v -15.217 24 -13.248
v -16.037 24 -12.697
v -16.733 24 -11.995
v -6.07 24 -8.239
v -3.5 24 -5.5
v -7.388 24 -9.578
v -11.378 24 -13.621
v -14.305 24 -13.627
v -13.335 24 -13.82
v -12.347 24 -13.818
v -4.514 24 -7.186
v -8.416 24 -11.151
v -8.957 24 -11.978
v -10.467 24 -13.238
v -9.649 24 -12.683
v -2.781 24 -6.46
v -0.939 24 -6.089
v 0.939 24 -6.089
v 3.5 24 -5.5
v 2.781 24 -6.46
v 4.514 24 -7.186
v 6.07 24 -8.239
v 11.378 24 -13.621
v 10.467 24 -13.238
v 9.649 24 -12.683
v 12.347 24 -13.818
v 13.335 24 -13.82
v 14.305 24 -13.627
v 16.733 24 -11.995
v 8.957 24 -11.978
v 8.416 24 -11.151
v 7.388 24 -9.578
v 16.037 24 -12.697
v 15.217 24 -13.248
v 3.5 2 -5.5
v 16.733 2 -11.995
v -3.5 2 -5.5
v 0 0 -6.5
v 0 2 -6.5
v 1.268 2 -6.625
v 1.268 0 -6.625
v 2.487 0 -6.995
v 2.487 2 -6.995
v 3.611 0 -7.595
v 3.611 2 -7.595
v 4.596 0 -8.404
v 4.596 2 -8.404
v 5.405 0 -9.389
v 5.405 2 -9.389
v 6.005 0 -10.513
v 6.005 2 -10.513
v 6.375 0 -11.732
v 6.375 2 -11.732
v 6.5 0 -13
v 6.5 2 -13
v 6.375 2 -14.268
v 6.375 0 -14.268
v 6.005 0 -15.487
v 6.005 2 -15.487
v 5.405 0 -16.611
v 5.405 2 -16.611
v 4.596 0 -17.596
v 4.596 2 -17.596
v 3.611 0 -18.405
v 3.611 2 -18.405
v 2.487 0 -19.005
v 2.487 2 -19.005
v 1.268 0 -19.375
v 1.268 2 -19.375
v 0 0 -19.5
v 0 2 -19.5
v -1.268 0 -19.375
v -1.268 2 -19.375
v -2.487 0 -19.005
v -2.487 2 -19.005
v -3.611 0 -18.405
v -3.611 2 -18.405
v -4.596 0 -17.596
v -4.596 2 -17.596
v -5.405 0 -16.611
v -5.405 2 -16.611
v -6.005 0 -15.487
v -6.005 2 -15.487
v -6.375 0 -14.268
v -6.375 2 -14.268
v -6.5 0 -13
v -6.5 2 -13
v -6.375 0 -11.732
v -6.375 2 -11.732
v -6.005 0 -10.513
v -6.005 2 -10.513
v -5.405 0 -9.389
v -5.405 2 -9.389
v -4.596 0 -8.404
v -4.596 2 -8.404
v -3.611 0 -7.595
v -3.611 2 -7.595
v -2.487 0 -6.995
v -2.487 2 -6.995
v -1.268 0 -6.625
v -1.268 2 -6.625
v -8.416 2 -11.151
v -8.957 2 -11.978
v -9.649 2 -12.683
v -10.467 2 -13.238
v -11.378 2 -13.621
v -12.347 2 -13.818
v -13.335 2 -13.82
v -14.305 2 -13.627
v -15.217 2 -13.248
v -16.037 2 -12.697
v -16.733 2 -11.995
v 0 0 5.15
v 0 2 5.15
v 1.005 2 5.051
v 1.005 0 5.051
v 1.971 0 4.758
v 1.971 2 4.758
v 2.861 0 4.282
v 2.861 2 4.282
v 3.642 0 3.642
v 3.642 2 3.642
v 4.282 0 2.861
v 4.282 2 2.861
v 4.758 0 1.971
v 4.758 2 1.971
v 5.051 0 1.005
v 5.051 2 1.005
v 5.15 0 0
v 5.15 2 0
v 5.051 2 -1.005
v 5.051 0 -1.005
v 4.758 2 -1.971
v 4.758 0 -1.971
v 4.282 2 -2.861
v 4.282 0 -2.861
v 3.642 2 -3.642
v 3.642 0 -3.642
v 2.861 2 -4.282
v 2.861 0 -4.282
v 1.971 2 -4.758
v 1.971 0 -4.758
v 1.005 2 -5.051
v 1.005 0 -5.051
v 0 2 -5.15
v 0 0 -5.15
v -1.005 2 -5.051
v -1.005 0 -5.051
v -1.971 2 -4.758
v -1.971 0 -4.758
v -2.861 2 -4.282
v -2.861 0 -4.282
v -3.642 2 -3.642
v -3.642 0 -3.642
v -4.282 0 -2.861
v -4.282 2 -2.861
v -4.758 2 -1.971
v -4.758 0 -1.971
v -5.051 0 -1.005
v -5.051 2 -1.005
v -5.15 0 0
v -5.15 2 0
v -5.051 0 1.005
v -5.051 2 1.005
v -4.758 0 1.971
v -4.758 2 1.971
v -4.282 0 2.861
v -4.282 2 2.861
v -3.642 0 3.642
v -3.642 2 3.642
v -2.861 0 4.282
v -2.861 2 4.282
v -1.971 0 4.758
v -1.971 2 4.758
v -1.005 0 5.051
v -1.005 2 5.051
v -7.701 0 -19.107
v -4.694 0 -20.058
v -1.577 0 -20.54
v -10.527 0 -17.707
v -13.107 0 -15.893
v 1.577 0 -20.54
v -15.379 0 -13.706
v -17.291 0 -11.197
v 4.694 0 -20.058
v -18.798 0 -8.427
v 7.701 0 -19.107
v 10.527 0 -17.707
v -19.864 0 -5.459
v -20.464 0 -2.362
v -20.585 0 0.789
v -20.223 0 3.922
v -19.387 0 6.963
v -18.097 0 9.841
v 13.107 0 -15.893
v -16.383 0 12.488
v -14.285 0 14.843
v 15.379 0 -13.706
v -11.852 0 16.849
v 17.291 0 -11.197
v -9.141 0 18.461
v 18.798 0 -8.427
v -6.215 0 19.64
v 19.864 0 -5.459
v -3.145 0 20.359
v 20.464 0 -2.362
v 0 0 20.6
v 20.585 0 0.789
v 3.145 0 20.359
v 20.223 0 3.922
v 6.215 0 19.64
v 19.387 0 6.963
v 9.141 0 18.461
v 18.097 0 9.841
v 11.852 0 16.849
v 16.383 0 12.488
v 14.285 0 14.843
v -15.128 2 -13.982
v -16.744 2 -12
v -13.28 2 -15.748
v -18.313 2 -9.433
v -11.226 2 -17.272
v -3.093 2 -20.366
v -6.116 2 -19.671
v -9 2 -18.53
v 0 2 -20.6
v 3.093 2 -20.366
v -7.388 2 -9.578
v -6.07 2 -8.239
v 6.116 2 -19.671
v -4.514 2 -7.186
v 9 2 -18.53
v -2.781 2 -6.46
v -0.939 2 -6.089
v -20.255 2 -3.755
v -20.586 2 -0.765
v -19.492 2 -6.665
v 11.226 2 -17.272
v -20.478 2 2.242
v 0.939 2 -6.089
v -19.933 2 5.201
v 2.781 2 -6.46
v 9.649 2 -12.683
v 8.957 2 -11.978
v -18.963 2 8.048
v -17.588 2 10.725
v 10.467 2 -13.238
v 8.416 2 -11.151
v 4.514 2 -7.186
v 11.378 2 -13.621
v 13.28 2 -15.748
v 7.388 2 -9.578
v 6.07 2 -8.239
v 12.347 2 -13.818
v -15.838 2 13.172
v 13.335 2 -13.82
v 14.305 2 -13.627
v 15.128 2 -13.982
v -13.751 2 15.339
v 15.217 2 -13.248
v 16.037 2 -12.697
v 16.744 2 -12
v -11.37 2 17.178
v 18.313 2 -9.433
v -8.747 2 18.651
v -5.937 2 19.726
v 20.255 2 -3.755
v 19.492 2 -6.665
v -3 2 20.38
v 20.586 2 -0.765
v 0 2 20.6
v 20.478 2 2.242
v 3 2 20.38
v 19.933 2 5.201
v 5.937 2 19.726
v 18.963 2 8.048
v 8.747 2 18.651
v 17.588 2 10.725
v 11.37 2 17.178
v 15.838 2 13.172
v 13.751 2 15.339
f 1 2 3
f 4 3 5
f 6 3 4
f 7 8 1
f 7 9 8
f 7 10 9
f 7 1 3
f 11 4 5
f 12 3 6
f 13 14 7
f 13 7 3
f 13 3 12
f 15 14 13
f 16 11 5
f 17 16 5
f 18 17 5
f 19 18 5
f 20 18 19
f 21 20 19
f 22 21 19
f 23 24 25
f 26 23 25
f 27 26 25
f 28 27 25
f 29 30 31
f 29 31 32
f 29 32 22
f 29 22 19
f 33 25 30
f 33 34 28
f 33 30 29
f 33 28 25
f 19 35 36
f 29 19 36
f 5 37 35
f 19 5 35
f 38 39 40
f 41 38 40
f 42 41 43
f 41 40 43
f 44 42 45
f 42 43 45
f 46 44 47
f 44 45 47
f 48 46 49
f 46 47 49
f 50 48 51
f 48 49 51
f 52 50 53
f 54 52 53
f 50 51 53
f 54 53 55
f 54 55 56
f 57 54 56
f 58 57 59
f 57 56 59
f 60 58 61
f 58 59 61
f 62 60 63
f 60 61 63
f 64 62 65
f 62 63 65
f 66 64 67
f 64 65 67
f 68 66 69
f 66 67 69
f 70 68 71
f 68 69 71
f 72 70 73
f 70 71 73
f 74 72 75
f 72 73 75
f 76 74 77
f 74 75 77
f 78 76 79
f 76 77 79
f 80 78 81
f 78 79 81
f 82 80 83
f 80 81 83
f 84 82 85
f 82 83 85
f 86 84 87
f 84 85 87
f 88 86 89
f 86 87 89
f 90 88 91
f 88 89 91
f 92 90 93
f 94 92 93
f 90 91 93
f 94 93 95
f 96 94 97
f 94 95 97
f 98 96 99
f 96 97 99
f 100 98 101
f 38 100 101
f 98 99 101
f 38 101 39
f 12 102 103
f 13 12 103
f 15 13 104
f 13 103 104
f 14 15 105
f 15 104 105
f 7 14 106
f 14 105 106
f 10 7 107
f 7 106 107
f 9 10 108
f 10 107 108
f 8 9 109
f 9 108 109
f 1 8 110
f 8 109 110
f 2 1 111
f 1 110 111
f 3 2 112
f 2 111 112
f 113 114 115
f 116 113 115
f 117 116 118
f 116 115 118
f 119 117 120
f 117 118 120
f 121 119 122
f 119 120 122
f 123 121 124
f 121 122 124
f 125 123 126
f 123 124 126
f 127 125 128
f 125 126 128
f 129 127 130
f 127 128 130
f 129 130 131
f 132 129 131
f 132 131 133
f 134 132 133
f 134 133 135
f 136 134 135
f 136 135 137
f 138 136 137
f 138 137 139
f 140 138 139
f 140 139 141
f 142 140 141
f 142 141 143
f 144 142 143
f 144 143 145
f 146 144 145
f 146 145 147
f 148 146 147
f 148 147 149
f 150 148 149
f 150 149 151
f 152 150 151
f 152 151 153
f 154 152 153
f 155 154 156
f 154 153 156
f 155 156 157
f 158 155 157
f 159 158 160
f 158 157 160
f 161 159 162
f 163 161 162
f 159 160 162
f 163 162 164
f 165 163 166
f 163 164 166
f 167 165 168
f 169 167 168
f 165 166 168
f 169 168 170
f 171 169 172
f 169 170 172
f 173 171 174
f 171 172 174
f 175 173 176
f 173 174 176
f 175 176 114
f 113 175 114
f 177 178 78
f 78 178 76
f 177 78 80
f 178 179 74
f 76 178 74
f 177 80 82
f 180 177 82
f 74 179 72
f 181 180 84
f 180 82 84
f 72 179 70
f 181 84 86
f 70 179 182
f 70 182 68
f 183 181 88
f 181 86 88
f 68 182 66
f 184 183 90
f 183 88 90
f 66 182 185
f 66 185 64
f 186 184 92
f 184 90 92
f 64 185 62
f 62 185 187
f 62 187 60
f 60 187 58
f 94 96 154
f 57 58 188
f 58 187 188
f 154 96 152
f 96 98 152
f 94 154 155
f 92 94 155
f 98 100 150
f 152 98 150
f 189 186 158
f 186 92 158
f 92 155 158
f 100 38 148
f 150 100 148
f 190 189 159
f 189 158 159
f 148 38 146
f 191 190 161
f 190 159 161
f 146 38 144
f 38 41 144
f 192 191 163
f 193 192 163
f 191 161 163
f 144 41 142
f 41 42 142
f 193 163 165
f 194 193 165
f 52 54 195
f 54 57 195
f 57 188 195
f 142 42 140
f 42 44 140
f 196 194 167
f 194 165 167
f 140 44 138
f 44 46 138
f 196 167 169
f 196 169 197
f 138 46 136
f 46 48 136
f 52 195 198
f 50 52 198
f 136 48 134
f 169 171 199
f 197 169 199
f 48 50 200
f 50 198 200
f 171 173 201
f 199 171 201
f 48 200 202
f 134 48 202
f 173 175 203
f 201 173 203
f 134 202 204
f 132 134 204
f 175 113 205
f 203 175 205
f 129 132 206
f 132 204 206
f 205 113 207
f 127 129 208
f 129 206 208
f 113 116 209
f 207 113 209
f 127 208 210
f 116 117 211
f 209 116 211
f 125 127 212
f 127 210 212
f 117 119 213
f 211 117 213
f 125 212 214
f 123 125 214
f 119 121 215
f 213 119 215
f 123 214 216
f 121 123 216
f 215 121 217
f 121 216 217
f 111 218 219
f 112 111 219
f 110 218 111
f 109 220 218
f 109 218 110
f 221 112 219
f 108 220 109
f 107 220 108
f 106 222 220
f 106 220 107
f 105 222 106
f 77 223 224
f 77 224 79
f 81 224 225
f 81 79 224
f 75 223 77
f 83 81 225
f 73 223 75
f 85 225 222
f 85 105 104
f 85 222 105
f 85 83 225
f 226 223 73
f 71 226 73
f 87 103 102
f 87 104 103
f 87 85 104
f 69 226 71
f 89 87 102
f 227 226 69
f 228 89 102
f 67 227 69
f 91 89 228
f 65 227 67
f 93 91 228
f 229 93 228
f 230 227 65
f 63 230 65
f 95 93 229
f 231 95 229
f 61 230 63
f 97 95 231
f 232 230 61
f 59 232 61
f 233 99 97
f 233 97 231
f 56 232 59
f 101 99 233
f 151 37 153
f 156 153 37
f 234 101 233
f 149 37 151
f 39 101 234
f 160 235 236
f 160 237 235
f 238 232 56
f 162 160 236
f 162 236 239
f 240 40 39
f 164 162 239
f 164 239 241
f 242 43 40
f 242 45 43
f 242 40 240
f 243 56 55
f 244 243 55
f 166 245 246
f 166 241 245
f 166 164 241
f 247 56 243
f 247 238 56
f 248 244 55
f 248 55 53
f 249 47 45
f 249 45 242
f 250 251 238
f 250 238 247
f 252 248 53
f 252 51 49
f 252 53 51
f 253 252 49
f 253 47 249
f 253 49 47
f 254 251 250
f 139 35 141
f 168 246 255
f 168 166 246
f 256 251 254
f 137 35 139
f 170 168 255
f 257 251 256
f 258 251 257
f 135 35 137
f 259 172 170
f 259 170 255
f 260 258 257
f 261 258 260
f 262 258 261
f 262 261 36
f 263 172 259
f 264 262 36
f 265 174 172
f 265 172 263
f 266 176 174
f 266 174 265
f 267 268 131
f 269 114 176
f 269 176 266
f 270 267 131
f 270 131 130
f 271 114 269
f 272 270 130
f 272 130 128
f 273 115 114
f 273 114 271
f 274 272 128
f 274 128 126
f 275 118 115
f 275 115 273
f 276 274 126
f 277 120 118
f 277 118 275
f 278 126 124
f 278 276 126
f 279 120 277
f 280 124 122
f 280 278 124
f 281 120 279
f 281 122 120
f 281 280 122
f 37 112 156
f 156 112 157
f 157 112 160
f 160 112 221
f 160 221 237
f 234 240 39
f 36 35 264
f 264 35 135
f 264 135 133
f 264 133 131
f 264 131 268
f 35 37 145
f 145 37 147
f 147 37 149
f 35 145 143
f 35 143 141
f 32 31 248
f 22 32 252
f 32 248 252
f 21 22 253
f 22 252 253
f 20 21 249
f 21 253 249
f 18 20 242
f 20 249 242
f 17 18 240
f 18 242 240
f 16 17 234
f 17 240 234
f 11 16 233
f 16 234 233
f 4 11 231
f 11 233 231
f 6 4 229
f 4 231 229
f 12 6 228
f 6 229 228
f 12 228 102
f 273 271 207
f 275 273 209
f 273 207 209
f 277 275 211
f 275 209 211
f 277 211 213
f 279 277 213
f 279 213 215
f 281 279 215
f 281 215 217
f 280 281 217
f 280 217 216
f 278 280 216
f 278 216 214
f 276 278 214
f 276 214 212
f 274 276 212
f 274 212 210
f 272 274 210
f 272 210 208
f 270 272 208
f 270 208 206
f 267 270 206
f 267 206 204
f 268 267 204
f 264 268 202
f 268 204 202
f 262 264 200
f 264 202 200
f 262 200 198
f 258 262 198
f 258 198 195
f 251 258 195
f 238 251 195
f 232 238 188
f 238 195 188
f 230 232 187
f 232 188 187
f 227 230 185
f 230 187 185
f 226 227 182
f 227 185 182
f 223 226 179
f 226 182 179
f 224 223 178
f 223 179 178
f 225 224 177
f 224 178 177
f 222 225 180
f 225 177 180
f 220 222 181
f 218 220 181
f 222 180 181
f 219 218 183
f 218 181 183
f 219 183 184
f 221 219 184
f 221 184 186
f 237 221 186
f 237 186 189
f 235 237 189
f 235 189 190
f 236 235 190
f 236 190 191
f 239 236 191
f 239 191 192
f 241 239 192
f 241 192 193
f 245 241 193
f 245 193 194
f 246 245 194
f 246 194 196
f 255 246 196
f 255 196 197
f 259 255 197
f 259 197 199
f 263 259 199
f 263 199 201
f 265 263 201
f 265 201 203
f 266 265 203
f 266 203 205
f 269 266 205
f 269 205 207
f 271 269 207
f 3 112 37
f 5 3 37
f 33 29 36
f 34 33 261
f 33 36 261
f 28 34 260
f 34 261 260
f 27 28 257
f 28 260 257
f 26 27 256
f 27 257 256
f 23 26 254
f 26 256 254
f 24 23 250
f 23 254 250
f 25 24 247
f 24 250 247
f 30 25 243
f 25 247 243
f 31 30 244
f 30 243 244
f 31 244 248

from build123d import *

# Parameters (mm, degrees)
SKETCH1_R           = 20.6
BOSS_EXTRUDE1_DEPTH = 2
SKETCH2_R           = 5.15
CUT_EXTRUDE1_DEPTH  = 3
SKETCH3_R           = 6.5
CUT_EXTRUDE2_DEPTH  = 2
BOSS_EXTRUDE4_DEPTH = 22
FILLET1_R           = 5


with BuildPart() as part:
    # Sketch1 → Boss-Extrude1 (new body)
    with BuildSketch(Plane(origin=(0, 0, 0), x_dir=(1, 0, 0), z_dir=(0, 1, 0))):
        with Locations(Location((0, 0, 0), (0, 0, 270))):
            Circle(SKETCH1_R)
    extrude(amount=BOSS_EXTRUDE1_DEPTH)

    # Sketch2 → Cut-Extrude1 (cut)
    with BuildSketch(Plane(origin=(0, 2, 0), x_dir=(1, 0, 0), z_dir=(0, 1, 0))):
        with Locations(Location((0, 0, 0), (0, 0, 270))):
            Circle(SKETCH2_R)
    extrude(amount=-CUT_EXTRUDE1_DEPTH, mode=Mode.SUBTRACT)

    # Sketch3 → Cut-Extrude2 (cut)
    with BuildSketch(Plane(origin=(0, 2, 0), x_dir=(1, 0, 0), z_dir=(0, 1, 0))):
        with Locations(Location((0, 13, 0), (0, 0, 270))):
            Circle(SKETCH3_R)
    extrude(amount=-CUT_EXTRUDE2_DEPTH, mode=Mode.SUBTRACT)

    # Sketch4 → Boss-Extrude4 (add)
    with BuildSketch(Plane(origin=(0, 2, 0), x_dir=(1, 0, 0), z_dir=(0, 1, 0))):
        with BuildLine():
            Line((-16.743954133, 12), (-3.5, 5.5))
            Line((-3.5, 5.5), (3.5, 5.5))
            Line((3.5, 5.5), (16.743954133, 12))
            ThreePointArc((16.743954133, 12), (13.279606143, 15.748398671), (9, 18.529975715))
            ThreePointArc((9, 18.529975715), (0, 6.042759079), (-9, 18.529975715))
            ThreePointArc((-9, 18.529975715), (-13.279606143, 15.748398671), (-16.743954133, 12))
        make_face()
    extrude(amount=BOSS_EXTRUDE4_DEPTH)

    # Fillet1
    # the kernel refuses this fillet: 5 mm, written as the material it takes off along each edge
    with BuildSketch(Plane(origin=(-9, 2, -18.529975715), x_dir=(-0.7582820448894503, 0, 0.6519266372823508), z_dir=(0, 1, 0))) as fillet1_piece_1:
        with BuildLine():
            CenterArc((9.235650387, 4.834535828), FILLET1_R, 166.800937992, 117.98025937)
            ThreePointArc((4.367737182, 5.976210486), (2.790781466, 2.544540557), (0, 0))
            ThreePointArc((0, 0), (5.255646353, -0.681712388), (10.511292706, 0))
        make_face()
    extrude(amount=48.278231764, mode=Mode.SUBTRACT)
    with BuildSketch(Plane(origin=(9, 2, -18.529975715), x_dir=(0.7582820448894505, 0, 0.6519266372823505), z_dir=(0, 1, 0))) as fillet1_piece_2:
        with BuildLine():
            CenterArc((9.235650387, -4.834535828), FILLET1_R, 75.218802639, 117.98025937)
            ThreePointArc((4.367737182, -5.976210486), (2.790781466, -2.544540557), (0, 0))
            ThreePointArc((0, 0), (5.255646353, 0.681712388), (10.511292706, 0))
        make_face()
    extrude(amount=48.278231764, mode=Mode.SUBTRACT)


solid = part.part
